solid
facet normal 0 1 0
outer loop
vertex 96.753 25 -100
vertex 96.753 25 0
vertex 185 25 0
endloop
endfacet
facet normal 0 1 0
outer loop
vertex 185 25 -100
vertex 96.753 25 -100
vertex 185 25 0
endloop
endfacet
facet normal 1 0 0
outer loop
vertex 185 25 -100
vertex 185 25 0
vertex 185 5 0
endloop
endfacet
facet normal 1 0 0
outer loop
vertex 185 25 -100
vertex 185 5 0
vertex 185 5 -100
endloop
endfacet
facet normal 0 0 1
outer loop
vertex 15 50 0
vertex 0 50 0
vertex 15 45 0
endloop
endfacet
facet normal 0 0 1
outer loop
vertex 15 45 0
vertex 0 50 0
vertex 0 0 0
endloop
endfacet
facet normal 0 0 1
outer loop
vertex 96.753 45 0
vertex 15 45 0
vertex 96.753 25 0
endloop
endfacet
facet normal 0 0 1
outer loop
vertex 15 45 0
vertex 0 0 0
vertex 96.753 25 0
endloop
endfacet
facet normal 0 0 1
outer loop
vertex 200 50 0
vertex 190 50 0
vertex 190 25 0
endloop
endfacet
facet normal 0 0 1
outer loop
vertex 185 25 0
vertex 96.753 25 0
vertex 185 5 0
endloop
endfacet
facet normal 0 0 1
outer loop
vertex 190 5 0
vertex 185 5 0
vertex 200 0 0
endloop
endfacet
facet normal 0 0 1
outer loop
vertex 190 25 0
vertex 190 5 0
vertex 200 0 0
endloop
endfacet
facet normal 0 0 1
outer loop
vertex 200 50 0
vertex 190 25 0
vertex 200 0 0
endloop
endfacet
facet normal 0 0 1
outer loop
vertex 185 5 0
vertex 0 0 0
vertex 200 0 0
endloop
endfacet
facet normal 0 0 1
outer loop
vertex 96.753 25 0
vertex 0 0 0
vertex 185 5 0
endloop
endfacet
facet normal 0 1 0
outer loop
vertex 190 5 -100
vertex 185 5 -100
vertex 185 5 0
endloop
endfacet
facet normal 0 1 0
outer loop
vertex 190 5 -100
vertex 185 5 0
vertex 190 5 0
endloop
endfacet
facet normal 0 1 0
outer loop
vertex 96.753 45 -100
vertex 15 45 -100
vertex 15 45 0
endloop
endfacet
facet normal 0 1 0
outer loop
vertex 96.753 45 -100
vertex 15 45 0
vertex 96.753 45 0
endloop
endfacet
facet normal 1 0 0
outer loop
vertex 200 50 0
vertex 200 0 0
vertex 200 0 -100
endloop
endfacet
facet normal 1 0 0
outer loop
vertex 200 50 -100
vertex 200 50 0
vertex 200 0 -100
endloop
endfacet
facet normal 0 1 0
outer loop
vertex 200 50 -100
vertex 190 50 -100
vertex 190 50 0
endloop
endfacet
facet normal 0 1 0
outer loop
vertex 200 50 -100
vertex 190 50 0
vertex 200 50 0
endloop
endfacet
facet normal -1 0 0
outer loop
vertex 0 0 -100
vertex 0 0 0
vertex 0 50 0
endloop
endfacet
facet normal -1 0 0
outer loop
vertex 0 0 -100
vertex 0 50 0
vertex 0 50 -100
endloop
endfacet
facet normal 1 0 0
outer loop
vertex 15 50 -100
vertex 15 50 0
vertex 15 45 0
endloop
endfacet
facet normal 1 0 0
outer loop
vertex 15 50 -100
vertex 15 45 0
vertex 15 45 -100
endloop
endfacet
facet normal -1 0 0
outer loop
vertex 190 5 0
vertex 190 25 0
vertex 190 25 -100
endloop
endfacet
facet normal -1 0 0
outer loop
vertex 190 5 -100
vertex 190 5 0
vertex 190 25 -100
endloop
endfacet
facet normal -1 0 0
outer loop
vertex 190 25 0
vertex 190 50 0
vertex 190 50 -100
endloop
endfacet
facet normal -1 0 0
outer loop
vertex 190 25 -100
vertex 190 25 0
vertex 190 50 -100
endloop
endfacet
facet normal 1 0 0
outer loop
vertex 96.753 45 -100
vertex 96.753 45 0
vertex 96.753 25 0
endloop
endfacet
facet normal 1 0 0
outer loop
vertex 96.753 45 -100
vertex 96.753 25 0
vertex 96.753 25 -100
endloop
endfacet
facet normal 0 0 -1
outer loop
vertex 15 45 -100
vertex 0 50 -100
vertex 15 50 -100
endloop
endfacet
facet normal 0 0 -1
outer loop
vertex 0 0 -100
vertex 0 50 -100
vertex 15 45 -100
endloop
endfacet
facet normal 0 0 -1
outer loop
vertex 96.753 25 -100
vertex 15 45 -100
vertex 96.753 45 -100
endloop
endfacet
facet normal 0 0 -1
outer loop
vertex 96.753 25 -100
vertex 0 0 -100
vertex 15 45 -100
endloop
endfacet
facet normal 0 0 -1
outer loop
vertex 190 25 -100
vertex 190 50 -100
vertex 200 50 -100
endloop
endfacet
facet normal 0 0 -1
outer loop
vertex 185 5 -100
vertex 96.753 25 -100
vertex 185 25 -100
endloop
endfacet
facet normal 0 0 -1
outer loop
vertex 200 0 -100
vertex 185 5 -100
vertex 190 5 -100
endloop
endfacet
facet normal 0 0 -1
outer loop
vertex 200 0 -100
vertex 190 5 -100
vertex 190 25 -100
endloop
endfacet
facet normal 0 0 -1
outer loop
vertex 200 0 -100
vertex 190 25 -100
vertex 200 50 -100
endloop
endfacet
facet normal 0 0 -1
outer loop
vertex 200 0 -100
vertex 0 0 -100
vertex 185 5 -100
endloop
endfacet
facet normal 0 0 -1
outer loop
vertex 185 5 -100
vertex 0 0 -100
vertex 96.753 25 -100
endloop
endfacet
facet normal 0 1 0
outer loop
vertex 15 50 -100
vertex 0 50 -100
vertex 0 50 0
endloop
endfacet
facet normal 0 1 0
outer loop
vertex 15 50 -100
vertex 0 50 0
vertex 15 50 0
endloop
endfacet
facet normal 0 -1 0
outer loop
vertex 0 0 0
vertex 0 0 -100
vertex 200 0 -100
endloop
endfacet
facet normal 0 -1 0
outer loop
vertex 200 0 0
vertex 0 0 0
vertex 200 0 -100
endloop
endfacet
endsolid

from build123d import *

# Parameters (mm, degrees)
SKETCH_1_W          = 200
SKETCH_1_H          = 100
EXTRUDE_1_DEPTH     = 50
SKETCH_2_W          = 81.752741681
SKETCH_2_H          = 100
CUT_EXTRUDE_1_DEPTH = 5
SKETCH_3_W          = 93.247258319
SKETCH_3_H          = 100
CUT_EXTRUDE_2_DEPTH = 25
SKETCH_4_W          = 5
SKETCH_4_H          = 100
CUT_EXTRUDE_3_DEPTH = 20


with BuildPart() as part:
    # 草图1 → 凸台-拉伸1 (new body)
    with BuildSketch(Plane(origin=(0, 0, 0), x_dir=(1, 0, 0), z_dir=(0, 1, 0))):
        with Locations((100, 50)):
            Rectangle(SKETCH_1_W, SKETCH_1_H)
    extrude(amount=EXTRUDE_1_DEPTH)

    # 草图2 → 切除-拉伸1 (cut)
    with BuildSketch(Plane(origin=(0, 50, 0), x_dir=(1, 0, 0), z_dir=(0, 1, 0))):
        with Locations((55.876370841, 50)):
            Rectangle(SKETCH_2_W, SKETCH_2_H)
    extrude(amount=-CUT_EXTRUDE_1_DEPTH, mode=Mode.SUBTRACT)

    # 草图3 → 切除-拉伸2 (cut)
    with BuildSketch(Plane(origin=(0, 50, 0), x_dir=(1, 0, 0), z_dir=(0, 1, 0))):
        with Locations((143.37637084, 50)):
            Rectangle(SKETCH_3_W, SKETCH_3_H)
    extrude(amount=-CUT_EXTRUDE_2_DEPTH, mode=Mode.SUBTRACT)

    # 草图4 → 切除-拉伸3 (cut)
    with BuildSketch(Plane(origin=(0, 25, 0), x_dir=(1, 0, 0), z_dir=(0, 1, 0))):
        with Locations((187.5, 50)):
            Rectangle(SKETCH_4_W, SKETCH_4_H)
    extrude(amount=-CUT_EXTRUDE_3_DEPTH, mode=Mode.SUBTRACT)


solid = part.part
